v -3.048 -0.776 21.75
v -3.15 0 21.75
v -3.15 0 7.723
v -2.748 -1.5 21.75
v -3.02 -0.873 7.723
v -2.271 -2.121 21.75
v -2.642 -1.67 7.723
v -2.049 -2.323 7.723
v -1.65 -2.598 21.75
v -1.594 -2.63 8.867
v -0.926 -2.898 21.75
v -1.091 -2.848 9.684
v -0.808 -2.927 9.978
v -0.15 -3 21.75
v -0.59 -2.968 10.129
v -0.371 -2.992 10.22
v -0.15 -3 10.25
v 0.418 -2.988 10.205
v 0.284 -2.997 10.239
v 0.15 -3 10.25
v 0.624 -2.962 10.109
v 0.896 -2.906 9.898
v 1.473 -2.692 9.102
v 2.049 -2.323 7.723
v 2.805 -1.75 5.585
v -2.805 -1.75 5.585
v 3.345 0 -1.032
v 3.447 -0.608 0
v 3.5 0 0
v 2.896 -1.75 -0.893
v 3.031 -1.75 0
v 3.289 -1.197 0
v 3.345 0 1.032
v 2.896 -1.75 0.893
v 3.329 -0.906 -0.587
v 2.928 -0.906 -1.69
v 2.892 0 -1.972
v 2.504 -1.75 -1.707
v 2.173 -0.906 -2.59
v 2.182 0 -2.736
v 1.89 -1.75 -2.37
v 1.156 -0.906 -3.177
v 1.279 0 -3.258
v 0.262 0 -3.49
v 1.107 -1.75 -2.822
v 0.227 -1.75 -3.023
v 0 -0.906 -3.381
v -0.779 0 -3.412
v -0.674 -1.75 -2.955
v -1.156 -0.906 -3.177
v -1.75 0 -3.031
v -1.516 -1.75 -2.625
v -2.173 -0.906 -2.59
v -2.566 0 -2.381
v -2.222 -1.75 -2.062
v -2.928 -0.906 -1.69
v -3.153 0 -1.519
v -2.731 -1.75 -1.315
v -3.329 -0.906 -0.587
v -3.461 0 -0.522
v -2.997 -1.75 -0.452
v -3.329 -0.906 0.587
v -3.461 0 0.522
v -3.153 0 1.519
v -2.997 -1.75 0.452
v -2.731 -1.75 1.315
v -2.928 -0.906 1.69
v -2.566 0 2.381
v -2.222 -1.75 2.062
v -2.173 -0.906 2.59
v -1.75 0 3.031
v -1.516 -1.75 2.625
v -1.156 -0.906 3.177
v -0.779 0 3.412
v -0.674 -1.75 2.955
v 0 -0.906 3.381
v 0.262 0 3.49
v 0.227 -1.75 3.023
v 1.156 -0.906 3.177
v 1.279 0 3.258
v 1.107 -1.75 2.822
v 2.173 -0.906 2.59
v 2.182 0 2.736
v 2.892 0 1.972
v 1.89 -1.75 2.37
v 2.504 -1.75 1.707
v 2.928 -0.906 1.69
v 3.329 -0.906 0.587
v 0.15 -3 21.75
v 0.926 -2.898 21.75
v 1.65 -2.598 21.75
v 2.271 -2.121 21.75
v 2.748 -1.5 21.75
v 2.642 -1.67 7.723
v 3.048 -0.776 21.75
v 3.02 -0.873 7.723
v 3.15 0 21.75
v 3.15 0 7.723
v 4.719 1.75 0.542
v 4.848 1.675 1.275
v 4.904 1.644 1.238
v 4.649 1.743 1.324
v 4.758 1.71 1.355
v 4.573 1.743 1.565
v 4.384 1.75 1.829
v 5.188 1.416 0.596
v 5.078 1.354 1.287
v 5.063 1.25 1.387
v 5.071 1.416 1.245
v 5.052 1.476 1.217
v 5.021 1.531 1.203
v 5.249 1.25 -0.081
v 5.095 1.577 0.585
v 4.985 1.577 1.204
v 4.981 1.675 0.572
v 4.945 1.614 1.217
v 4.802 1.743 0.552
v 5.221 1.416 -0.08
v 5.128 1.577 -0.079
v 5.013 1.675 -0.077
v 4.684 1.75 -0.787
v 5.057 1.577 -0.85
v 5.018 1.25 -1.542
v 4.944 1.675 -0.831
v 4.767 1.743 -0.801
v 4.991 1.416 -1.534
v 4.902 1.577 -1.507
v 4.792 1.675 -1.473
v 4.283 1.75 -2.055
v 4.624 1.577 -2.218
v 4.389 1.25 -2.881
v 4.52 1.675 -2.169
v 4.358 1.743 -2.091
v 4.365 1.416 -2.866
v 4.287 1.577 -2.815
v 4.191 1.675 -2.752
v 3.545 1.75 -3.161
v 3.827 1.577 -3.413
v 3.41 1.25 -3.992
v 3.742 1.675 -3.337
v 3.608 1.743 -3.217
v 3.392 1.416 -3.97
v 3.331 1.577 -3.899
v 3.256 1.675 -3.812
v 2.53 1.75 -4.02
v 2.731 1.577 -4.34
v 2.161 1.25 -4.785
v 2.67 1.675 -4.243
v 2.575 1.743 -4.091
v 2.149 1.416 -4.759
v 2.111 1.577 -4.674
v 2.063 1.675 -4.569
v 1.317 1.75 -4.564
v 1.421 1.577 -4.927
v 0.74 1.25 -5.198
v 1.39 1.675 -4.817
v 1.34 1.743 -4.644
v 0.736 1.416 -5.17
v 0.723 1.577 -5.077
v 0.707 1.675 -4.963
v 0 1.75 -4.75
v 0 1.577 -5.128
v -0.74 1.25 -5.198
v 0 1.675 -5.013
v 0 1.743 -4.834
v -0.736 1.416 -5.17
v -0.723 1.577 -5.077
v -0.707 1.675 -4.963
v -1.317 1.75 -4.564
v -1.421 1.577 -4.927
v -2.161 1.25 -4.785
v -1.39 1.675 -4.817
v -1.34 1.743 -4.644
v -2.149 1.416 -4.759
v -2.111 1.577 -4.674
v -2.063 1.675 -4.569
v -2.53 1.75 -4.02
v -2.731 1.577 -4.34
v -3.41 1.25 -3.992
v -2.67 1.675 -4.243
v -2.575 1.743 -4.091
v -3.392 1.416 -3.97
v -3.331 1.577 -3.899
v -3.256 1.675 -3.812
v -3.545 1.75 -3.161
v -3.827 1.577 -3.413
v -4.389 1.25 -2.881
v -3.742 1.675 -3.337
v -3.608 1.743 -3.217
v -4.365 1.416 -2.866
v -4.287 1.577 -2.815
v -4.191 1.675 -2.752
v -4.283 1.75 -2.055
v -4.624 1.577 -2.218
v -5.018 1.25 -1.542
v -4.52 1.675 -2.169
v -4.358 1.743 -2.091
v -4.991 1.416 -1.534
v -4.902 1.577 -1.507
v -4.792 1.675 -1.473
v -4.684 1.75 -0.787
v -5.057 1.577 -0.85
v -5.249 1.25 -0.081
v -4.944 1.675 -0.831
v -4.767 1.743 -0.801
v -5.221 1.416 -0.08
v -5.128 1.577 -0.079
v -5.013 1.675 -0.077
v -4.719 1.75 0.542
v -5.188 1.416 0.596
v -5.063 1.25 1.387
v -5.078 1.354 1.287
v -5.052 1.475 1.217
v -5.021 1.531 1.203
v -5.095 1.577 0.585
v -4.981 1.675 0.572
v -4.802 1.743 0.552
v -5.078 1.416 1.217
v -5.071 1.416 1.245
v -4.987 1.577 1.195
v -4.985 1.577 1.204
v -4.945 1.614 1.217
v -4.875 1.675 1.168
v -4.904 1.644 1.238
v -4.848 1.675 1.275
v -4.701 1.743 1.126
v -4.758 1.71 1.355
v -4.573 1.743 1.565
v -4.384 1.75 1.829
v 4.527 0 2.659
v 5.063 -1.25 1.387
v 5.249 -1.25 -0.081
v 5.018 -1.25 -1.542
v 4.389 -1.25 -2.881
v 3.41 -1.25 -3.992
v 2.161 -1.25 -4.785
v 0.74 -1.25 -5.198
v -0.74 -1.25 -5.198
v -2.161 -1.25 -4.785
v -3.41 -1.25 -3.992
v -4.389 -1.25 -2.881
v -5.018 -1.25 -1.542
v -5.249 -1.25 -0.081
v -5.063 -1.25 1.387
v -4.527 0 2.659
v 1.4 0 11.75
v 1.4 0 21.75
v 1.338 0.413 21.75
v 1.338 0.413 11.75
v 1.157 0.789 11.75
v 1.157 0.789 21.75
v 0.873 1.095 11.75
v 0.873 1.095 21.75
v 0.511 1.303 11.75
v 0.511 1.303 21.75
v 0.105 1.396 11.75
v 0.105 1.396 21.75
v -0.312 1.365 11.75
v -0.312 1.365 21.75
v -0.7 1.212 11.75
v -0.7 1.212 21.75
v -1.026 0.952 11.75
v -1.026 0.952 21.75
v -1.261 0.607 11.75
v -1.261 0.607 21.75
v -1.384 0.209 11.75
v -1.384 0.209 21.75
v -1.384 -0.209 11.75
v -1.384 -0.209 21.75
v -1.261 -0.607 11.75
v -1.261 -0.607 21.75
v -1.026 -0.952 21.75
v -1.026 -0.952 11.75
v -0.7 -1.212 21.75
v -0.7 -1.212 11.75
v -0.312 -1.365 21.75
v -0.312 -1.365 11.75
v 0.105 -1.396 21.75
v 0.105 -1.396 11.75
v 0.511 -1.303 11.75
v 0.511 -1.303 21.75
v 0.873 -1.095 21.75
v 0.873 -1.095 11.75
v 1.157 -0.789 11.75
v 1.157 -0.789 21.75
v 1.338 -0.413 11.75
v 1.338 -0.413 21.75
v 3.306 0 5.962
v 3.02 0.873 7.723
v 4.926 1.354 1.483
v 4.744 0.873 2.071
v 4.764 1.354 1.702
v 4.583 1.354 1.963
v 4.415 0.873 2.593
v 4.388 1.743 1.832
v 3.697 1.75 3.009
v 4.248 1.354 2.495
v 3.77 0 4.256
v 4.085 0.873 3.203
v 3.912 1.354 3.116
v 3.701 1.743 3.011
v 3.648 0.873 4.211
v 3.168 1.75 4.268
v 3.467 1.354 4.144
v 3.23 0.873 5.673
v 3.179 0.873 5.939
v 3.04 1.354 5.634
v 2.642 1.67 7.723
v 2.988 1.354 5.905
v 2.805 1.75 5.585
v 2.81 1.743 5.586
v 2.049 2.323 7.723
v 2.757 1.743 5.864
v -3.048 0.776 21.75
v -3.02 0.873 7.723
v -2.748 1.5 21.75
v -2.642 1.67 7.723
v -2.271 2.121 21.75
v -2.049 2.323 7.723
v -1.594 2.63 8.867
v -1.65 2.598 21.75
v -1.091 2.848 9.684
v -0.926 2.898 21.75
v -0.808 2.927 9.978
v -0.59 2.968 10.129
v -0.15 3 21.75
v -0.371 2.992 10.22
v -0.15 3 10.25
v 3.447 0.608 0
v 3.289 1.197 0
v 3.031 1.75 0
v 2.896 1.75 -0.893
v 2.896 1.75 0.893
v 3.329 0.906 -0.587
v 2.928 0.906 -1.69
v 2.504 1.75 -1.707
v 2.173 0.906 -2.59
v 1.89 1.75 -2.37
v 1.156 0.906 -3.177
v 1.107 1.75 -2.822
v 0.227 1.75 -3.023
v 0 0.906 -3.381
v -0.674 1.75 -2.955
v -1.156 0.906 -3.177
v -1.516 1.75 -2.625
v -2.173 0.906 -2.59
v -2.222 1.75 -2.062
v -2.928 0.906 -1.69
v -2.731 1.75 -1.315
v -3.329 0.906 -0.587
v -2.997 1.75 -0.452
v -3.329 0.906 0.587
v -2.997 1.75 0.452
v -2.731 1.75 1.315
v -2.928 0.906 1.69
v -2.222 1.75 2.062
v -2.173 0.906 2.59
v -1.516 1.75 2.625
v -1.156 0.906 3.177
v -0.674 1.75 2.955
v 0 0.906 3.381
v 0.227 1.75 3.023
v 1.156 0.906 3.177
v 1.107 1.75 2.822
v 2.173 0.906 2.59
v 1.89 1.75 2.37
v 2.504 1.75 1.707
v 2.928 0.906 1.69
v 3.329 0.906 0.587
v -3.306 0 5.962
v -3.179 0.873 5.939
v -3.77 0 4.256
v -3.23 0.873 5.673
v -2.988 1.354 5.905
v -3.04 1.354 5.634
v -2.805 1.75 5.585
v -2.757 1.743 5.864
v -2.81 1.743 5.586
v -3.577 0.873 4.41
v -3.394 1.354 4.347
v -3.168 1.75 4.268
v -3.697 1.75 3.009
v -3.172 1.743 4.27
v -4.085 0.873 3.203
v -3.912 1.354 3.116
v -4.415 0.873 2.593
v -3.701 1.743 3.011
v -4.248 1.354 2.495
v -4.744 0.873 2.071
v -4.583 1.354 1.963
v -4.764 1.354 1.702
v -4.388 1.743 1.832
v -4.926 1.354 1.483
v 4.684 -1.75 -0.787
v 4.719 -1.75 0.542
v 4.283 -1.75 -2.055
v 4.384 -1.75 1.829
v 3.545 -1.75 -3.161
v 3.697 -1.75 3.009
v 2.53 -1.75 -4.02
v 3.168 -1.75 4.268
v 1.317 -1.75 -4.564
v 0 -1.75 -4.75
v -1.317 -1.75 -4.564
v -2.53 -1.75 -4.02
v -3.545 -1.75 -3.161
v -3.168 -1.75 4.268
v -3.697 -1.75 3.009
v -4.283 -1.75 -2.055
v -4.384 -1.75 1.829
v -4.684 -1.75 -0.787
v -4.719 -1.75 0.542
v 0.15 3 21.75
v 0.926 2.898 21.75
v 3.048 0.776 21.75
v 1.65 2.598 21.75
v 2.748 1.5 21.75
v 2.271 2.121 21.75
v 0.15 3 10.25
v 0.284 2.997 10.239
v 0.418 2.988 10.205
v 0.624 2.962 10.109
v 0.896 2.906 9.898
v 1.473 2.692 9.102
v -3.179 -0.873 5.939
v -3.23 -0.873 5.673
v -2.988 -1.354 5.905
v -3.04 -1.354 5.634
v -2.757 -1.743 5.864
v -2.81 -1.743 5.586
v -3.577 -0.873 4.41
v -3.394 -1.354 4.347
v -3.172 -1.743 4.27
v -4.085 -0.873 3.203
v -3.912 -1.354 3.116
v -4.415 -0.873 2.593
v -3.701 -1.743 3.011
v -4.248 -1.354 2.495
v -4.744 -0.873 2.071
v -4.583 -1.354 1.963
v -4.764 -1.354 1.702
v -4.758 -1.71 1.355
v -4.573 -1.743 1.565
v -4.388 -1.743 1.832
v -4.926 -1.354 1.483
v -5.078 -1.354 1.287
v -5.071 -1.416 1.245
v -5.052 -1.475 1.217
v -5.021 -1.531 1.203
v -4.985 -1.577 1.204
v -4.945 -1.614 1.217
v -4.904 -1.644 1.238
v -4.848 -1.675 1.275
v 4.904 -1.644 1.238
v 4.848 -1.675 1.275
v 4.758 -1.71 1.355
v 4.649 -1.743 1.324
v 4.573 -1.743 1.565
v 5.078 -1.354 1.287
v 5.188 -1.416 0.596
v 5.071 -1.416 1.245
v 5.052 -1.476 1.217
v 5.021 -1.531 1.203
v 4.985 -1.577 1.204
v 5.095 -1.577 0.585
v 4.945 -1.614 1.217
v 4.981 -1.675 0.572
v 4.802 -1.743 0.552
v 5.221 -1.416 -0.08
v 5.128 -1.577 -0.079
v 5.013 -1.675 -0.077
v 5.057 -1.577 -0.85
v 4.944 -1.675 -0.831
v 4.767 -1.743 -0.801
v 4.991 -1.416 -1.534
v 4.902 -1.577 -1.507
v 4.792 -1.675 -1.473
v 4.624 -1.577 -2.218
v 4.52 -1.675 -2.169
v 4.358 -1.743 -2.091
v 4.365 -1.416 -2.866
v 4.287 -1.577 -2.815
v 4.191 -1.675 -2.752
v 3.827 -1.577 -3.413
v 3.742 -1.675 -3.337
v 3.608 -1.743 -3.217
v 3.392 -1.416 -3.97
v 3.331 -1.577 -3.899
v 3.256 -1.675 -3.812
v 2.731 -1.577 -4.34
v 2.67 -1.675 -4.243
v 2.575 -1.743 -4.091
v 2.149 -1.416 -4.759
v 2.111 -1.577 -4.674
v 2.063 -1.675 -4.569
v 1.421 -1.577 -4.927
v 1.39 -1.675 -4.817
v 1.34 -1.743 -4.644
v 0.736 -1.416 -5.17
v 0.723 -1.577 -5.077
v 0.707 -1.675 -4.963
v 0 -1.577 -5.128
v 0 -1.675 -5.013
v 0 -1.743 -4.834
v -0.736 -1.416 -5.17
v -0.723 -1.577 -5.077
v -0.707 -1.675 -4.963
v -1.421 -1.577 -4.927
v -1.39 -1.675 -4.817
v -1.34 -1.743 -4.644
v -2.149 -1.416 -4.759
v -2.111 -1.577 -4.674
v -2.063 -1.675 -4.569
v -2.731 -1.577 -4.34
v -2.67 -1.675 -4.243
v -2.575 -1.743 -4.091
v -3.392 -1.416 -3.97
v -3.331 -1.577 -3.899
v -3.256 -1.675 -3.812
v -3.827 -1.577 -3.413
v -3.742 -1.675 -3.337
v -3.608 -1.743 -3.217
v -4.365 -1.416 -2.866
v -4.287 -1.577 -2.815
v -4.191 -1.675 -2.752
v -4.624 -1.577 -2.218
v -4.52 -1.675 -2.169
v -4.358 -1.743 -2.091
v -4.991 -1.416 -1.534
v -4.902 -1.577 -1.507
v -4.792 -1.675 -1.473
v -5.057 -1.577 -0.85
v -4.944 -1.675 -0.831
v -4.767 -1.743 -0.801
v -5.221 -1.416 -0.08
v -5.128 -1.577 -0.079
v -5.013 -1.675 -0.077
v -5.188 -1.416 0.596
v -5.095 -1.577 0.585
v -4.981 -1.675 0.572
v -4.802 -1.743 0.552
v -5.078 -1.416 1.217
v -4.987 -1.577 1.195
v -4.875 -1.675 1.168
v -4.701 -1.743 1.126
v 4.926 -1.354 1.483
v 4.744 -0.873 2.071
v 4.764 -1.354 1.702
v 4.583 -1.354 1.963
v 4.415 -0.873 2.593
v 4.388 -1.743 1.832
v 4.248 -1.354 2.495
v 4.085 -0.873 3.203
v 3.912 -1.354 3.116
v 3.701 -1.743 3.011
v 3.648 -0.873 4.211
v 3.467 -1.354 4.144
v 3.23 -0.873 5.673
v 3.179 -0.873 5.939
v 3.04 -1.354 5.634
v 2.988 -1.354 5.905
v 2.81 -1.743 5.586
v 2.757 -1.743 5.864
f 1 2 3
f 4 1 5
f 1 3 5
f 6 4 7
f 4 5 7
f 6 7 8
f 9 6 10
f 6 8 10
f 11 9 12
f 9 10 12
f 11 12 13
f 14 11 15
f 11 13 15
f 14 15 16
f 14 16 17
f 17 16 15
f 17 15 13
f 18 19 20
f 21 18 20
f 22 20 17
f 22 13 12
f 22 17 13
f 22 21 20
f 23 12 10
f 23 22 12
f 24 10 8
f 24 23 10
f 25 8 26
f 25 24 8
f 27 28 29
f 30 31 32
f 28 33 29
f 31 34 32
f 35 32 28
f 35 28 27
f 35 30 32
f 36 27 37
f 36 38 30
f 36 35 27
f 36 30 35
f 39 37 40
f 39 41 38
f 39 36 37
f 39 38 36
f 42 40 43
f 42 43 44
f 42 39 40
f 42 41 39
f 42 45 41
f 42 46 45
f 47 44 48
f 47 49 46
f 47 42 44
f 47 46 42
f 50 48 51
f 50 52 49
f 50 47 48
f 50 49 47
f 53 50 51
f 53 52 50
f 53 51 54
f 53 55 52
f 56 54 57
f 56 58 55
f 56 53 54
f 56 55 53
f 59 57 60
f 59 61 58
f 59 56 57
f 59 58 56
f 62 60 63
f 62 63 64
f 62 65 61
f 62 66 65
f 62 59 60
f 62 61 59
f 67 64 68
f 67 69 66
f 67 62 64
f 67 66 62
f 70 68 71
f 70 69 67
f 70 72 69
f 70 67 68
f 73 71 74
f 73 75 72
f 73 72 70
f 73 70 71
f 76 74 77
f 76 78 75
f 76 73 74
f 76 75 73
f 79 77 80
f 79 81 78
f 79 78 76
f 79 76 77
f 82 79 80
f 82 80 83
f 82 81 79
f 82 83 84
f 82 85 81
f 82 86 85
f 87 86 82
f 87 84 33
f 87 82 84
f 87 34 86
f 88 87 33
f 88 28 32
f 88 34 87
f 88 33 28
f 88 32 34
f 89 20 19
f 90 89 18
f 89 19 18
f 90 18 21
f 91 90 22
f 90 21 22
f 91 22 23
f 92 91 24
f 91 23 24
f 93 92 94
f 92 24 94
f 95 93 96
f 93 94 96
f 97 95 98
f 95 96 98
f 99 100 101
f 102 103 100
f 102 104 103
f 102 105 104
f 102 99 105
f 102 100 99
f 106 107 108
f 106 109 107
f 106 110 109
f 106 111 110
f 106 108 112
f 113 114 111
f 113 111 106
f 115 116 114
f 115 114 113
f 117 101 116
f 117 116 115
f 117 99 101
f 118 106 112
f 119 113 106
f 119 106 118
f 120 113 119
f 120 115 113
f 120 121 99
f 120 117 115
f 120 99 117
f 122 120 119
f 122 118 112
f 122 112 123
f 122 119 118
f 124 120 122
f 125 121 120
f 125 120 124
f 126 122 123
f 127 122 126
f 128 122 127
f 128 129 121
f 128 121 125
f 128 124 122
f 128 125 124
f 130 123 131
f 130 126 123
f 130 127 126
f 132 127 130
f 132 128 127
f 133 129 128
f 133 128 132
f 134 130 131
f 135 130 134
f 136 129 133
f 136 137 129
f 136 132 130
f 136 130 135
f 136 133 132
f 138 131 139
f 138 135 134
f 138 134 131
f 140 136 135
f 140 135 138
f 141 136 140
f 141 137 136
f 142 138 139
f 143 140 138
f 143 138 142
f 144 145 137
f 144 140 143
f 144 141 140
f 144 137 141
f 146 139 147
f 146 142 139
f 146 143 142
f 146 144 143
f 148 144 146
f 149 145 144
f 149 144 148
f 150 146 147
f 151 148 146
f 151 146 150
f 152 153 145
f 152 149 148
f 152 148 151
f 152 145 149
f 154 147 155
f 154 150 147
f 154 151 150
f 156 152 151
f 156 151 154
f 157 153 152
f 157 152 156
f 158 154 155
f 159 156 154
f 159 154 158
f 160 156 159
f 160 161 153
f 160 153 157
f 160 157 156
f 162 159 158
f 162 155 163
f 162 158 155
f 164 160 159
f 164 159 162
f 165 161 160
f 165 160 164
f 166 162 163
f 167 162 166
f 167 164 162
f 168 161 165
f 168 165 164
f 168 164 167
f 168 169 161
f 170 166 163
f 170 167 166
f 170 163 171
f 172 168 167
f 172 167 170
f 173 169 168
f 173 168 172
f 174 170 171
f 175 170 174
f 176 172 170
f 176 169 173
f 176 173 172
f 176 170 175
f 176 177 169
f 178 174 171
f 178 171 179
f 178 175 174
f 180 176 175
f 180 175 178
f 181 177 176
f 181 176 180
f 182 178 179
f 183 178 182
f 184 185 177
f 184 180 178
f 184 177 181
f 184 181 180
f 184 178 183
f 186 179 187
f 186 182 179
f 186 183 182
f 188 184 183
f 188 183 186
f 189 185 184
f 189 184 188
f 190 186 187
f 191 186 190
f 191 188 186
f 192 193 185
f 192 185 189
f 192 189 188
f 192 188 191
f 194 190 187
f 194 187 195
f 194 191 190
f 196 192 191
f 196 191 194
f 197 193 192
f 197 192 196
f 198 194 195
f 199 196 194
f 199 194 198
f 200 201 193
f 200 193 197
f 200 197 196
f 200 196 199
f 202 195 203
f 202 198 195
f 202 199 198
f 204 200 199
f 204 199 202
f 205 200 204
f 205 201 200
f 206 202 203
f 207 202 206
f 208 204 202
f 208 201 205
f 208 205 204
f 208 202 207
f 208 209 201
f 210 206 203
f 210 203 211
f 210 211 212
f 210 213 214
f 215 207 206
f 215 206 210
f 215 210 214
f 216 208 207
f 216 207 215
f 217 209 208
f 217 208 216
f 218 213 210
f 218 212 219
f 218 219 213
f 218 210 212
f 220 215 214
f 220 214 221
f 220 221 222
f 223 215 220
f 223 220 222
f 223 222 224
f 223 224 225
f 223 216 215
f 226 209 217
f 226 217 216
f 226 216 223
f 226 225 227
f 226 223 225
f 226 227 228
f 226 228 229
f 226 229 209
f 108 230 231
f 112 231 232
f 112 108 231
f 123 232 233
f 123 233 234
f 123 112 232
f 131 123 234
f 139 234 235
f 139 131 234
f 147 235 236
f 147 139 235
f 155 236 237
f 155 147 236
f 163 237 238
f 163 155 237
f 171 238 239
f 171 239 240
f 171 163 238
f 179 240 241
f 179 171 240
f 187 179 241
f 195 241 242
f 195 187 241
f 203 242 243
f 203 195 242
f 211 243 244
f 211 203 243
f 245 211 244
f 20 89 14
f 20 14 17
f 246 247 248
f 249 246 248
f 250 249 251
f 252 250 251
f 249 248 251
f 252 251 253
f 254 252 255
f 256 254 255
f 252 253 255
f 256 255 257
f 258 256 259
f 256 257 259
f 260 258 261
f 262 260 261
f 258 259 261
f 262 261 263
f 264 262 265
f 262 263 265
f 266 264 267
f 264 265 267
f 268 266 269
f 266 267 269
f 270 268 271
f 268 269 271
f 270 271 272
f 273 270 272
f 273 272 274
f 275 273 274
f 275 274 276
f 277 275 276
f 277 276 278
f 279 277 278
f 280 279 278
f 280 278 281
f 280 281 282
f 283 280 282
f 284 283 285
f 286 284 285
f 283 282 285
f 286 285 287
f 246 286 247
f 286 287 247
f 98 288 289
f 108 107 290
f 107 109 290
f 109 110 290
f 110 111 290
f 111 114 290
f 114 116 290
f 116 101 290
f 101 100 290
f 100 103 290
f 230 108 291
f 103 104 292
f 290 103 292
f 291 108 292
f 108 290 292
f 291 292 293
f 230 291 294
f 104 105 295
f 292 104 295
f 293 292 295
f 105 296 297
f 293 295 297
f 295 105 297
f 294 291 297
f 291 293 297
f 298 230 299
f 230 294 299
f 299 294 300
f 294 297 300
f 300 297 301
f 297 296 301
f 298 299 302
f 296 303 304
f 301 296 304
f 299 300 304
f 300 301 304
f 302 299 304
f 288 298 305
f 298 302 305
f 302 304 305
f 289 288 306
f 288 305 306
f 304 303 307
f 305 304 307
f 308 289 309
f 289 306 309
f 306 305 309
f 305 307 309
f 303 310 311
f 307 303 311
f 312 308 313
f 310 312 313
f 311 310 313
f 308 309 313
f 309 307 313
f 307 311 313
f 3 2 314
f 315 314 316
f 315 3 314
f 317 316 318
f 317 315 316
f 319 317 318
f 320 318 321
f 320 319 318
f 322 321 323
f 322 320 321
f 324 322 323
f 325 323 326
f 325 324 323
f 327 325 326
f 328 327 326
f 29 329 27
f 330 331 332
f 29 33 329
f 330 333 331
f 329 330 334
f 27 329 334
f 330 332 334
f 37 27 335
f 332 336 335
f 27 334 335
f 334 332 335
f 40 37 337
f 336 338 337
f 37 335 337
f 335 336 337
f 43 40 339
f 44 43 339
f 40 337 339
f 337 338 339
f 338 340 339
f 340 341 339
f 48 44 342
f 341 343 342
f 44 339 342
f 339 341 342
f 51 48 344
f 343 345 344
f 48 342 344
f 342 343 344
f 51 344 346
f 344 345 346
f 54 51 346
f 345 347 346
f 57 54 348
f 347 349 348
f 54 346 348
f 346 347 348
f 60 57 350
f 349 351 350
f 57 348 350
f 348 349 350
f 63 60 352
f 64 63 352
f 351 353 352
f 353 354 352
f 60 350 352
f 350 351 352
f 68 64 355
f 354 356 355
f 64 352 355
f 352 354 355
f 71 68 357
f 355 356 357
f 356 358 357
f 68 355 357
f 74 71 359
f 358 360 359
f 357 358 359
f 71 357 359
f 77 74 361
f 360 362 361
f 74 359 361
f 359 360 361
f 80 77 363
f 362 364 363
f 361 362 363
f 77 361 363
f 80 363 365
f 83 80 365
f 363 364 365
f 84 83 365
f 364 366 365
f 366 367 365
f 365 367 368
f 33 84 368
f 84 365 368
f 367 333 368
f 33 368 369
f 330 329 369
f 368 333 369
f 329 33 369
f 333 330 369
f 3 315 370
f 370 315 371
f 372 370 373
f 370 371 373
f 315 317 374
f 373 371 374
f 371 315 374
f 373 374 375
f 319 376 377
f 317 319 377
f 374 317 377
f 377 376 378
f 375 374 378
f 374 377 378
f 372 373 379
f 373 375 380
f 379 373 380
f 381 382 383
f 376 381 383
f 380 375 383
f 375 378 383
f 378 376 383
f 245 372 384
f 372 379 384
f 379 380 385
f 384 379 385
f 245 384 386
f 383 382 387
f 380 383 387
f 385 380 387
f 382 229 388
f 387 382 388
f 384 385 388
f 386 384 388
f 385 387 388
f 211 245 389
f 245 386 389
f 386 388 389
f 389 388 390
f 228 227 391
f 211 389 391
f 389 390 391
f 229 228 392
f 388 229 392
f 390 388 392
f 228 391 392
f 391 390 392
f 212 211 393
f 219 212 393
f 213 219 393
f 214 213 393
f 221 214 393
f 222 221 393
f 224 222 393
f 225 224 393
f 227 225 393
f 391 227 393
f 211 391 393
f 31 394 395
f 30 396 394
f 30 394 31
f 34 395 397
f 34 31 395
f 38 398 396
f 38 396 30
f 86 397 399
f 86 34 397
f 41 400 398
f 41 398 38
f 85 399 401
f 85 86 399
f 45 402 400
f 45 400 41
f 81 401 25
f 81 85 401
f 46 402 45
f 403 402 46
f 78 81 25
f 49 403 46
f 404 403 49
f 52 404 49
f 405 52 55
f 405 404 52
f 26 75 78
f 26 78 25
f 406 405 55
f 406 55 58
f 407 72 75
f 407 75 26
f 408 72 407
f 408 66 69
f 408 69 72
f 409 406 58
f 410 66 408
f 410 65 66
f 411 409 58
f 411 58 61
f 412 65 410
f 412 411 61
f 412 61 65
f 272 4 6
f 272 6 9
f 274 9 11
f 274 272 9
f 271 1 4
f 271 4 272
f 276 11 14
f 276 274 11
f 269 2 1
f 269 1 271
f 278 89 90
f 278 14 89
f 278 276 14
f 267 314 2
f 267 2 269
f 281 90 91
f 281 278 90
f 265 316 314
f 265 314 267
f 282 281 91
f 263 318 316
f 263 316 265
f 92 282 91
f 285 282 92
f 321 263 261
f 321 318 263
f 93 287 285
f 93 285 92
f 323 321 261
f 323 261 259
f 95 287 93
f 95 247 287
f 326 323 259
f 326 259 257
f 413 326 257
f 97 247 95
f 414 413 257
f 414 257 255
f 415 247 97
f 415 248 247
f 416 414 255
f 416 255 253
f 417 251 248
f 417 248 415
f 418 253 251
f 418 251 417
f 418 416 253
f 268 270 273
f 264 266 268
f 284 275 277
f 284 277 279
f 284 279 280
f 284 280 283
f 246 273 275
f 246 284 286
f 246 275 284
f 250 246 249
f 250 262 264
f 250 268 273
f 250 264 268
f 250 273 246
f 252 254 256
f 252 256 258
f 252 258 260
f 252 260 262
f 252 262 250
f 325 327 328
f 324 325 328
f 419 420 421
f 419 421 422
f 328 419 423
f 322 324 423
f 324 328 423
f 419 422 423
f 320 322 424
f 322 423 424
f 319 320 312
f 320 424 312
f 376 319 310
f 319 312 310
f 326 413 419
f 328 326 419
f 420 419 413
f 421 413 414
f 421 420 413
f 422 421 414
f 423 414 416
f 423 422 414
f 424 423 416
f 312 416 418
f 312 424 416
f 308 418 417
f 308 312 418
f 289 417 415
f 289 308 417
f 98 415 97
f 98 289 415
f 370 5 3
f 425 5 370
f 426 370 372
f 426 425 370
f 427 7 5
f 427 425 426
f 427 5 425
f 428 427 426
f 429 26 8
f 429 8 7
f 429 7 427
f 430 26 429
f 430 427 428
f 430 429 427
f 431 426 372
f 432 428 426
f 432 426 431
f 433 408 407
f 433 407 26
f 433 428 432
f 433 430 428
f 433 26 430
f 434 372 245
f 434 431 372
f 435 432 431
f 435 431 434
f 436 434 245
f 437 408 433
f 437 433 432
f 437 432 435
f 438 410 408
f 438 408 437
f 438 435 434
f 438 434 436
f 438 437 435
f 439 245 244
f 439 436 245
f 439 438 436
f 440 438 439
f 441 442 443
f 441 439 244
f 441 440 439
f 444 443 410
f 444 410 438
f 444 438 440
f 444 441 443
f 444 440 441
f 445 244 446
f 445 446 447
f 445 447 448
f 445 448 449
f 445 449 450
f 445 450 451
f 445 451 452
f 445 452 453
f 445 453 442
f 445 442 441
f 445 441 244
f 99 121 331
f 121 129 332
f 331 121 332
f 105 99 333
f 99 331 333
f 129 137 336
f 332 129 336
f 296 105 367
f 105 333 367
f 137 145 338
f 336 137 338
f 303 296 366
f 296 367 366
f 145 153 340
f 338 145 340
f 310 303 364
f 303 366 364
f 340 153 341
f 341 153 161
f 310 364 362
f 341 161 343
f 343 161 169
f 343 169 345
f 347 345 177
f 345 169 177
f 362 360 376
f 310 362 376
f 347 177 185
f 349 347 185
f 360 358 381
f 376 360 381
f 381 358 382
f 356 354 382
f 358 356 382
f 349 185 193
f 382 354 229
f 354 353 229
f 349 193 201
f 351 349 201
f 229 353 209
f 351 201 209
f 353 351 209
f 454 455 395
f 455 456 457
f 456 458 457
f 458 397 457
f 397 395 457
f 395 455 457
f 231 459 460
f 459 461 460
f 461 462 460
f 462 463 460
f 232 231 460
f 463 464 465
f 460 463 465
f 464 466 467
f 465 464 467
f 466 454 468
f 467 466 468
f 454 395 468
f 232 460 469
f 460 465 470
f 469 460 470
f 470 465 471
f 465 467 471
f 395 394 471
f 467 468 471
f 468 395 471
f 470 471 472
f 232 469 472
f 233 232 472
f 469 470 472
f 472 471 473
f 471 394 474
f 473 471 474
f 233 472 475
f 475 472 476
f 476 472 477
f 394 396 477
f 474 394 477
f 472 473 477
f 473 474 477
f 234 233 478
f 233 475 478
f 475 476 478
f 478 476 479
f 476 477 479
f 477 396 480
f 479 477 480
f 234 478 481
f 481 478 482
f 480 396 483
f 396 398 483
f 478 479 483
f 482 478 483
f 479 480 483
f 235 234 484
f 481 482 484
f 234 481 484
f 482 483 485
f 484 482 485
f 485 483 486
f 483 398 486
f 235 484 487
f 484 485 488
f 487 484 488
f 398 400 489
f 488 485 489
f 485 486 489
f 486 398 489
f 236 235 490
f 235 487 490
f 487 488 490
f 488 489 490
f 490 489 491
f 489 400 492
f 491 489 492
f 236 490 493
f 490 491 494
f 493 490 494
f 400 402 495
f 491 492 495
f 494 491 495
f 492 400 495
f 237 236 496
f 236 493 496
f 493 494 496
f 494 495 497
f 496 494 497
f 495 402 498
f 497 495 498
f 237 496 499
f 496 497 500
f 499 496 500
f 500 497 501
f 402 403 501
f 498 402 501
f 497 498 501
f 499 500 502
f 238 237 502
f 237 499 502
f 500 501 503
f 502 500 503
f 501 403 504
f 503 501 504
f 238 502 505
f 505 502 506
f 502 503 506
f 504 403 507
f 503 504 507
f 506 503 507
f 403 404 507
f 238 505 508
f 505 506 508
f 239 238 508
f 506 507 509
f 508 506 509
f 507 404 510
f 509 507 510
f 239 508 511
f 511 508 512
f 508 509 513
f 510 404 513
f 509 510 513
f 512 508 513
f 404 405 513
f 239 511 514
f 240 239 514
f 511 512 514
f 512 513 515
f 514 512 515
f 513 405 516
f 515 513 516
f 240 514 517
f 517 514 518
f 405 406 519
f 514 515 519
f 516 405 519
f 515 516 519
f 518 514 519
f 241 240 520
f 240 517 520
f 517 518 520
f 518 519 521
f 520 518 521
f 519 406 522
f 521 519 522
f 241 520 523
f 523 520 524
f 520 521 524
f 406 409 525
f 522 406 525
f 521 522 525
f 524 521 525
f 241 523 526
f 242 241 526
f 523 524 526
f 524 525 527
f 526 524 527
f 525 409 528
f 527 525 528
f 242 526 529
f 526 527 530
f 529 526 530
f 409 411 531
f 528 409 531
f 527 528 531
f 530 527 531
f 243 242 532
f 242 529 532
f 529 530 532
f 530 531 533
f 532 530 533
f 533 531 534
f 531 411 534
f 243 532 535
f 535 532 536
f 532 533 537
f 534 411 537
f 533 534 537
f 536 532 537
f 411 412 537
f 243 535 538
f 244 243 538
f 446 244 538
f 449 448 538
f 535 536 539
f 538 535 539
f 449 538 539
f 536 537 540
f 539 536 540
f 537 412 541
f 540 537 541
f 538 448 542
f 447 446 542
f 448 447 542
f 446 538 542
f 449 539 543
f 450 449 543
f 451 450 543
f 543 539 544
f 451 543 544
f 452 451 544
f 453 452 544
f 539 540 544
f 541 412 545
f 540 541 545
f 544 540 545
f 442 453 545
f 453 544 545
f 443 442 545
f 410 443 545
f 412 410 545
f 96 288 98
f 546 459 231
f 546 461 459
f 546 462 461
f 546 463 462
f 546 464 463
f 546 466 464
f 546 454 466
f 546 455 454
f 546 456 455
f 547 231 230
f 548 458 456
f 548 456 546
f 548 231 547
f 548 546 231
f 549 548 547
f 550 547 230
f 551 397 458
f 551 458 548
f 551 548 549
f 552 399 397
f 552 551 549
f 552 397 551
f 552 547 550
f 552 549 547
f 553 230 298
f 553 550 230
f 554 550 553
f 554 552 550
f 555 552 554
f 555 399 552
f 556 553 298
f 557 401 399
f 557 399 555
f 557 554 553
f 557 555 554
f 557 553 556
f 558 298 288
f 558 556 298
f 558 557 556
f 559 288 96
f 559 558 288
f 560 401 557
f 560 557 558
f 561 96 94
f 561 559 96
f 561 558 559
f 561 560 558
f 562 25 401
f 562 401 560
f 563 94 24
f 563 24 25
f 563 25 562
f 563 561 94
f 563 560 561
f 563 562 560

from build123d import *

# Parameters (mm, degrees)
BOSS_EXTRUDE1_DEPTH = 3
CUT_EXTRUDE1_START  = -1.25
CUT_EXTRUDE1_DEPTH  = 1.25
FILLET2_R           = 10
CHAMFER1_SIZE       = 5
CHAMFER1_SIZE_2     = 1.339745962
FILLET3_START       = 7.722693831
FILLET3_DEPTH       = 14.027306169
FILLET3_2_ANGLE     = 41.120463
FILLET3_3_ANGLE     = 41.120463
FILLET4_R           = 0.5
SKETCH10_R          = 1.4
CUT_EXTRUDE3_DEPTH  = 10


with BuildPart() as part:
    # Sketch1 → Boss-Extrude1 (new body)
    with BuildSketch(Plane(origin=(0, 0, 0), x_dir=(1, 0, 0), z_dir=(0, 1, 0))):
        with BuildLine():
            Line((-3.15, -4.2), (-3.15, -21.75))
            Line((-3.15, -21.75), (3.15, -21.75))
            Line((3.15, -21.75), (3.15, -4.2))
            ThreePointArc((3.15, -4.2), (0, 5.25), (-3.15, -4.2))
        make_face()
    extrude(amount=BOSS_EXTRUDE1_DEPTH)

    # Sketch2 → Cut-Extrude1 (cut)
    with BuildSketch(Plane(origin=(0, 3, 0), x_dir=(1, 0, 0), z_dir=(0, 1, 0)).offset(CUT_EXTRUDE1_START)):
        with BuildLine():
            Line((-3.15, -4.2), (-3.15, -5.25))
            Line((-3.15, -5.25), (3.15, -5.25))
            Line((3.15, -5.25), (3.15, -4.2))
            ThreePointArc((3.15, -4.2), (0, 5.25), (-3.15, -4.2))
        make_face()
    extrude(amount=CUT_EXTRUDE1_DEPTH, mode=Mode.SUBTRACT)

    # Cut-Sweep1: sweep along a path in Sketch9
    with BuildLine(Plane(origin=(0, 0, 0), x_dir=(1, 0, 0), z_dir=(0, 1, 0))) as cut_sweep1_path:
        CenterArc((0, 0), 3.5, 0, 360)
    # Sketch8 → Cut-Sweep1 (sweep, cut)
    with BuildSketch(Plane(origin=(0, 0, 0), x_dir=(0, 0, -1), z_dir=(1, 0, 0))):
        with BuildLine():
            Line((0, 3.5), (0, 0))
            Line((0, 0), (3.5, 0))
            ThreePointArc((3.5, 0), (2.474873734, 2.474873734), (0, 3.5))
        make_face()
    sweep(path=cut_sweep1_path.line, mode=Mode.SUBTRACT)

    # Fillet2
    # the kernel refuses this fillet: 10 mm, written as the material it adds along each edge
    with BuildSketch(Plane(origin=(-3.15, 0, 4.2), x_dir=(0, 0, 1), z_dir=(0, 1, 0))) as fillet2_piece_1_section:
        with BuildLine():
            CenterArc((3.522693831, -10), FILLET2_R, 90, 30.424740483)
            ThreePointArc((-1.541367698, -1.37704918), (-0.702247096, -0.765127664), (0, 0))
            Line((0, 0), (3.522693831, 0))
        make_face()
    fillet2_piece_1 = extrude(amount=1.75, mode=Mode.PRIVATE)
    fillet2_piece_1 = split(fillet2_piece_1, bisect_by=Plane(origin=(-3.15, 0, 5.25), z_dir=(0, 0, 1)), keep=Keep.TOP, mode=Mode.PRIVATE)
    add(fillet2_piece_1)
    with BuildSketch(Plane(origin=(-3.15, 0, 4.2), x_dir=(0, 0, 1), z_dir=(0, 1, 0))) as fillet2_piece_2_section:
        with BuildLine():
            CenterArc((3.522693831, -10), FILLET2_R, 90, 30.424740483)
            ThreePointArc((-1.541367698, -1.37704918), (-0.702247096, -0.765127664), (0, 0))
            Line((0, 0), (3.522693831, 0))
        make_face()
    fillet2_piece_2 = extrude(amount=1.75, mode=Mode.PRIVATE)
    fillet2_piece_2 = split(fillet2_piece_2, bisect_by=Plane(origin=(-3.15, 0, 5.25), z_dir=(0, 0, -1)), keep=Keep.TOP, mode=Mode.PRIVATE)
    add(fillet2_piece_2)
    with BuildSketch(Plane(origin=(-3.15, 0, 4.2), x_dir=(0, 0, 1), z_dir=(0, 1, 0))) as fillet2_piece_3_section:
        with BuildLine():
            CenterArc((3.522693831, -10), FILLET2_R, 90, 30.424740483)
            ThreePointArc((-1.541367698, -1.37704918), (-0.702247096, -0.765127664), (0, 0))
            Line((0, 0), (3.522693831, 0))
        make_face()
    fillet2_piece_3 = extrude(amount=10.556734576, mode=Mode.PRIVATE)
    fillet2_piece_3 = split(fillet2_piece_3, bisect_by=Plane(origin=(-3.15, 3, 4.2), z_dir=(0, -1, 0)), keep=Keep.TOP, mode=Mode.PRIVATE)
    fillet2_piece_3 = split(fillet2_piece_3, bisect_by=Plane(origin=(-3.15, 0, 5.25), z_dir=(0, 0, 1)), keep=Keep.TOP, mode=Mode.PRIVATE)
    fillet2_piece_3 = split(fillet2_piece_3, bisect_by=Plane(origin=(-3.15, 1.75, 4.2), z_dir=(0, 1, 0)), keep=Keep.TOP, mode=Mode.PRIVATE)
    add(fillet2_piece_3)
    with BuildSketch(Plane(origin=(3.15, 0, 4.2), x_dir=(0.6662386483372984, 0, -0.7457386026361313), z_dir=(0, 1, 0))) as fillet2_piece_4_section:
        with BuildLine():
            CenterArc((4.035377709, -9.804340803), FILLET2_R, 101.352680936, 30.424740483)
            Line((-2.627008775, -2.346954776), (0, 0))
            ThreePointArc((0, 0), (1.033450389, -0.102721079), (2.066900778, 0))
        make_face()
    fillet2_piece_4 = extrude(amount=1.75, mode=Mode.PRIVATE)
    fillet2_piece_4 = split(fillet2_piece_4, bisect_by=Plane(origin=(3.15, 0, 5.25), z_dir=(0, 0, -1)), keep=Keep.TOP, mode=Mode.PRIVATE)
    add(fillet2_piece_4)
    with BuildSketch(Plane(origin=(3.15, 0, 4.2), x_dir=(0.6662386483372984, 0, -0.7457386026361313), z_dir=(0, 1, 0))) as fillet2_piece_5_section:
        with BuildLine():
            CenterArc((4.035377709, -9.804340803), FILLET2_R, 101.352680936, 30.424740483)
            Line((-2.627008775, -2.346954776), (0, 0))
            ThreePointArc((0, 0), (1.033450389, -0.102721079), (2.066900778, 0))
        make_face()
    fillet2_piece_5 = extrude(amount=1.75, mode=Mode.PRIVATE)
    fillet2_piece_5 = split(fillet2_piece_5, bisect_by=Plane(origin=(3.15, 0, 5.25), z_dir=(0, 0, 1)), keep=Keep.TOP, mode=Mode.PRIVATE)
    add(fillet2_piece_5)
    with BuildSketch(Plane(origin=(3.15, 0, 4.2), x_dir=(0.6662386483372984, 0, -0.7457386026361313), z_dir=(0, 1, 0))) as fillet2_piece_6_section:
        with BuildLine():
            CenterArc((4.035377709, -9.804340803), FILLET2_R, 101.352680936, 30.424740483)
            Line((-2.627008775, -2.346954776), (0, 0))
            ThreePointArc((0, 0), (1.033450389, -0.102721079), (2.066900778, 0))
        make_face()
    fillet2_piece_6 = extrude(amount=10.556734576, mode=Mode.PRIVATE)
    fillet2_piece_6 = split(fillet2_piece_6, bisect_by=Plane(origin=(3.15, 3, 4.2), z_dir=(0, -1, 0)), keep=Keep.TOP, mode=Mode.PRIVATE)
    fillet2_piece_6 = split(fillet2_piece_6, bisect_by=Plane(origin=(3.15, 0, 5.25), z_dir=(0, 0, 1)), keep=Keep.TOP, mode=Mode.PRIVATE)
    fillet2_piece_6 = split(fillet2_piece_6, bisect_by=Plane(origin=(3.15, 1.75, 4.2), z_dir=(0, 1, 0)), keep=Keep.TOP, mode=Mode.PRIVATE)
    add(fillet2_piece_6)

    # Chamfer1
    # the kernel refuses this chamfer: 5, 1.339745962 mm, written as the material it takes off along each edge
    with BuildSketch(Plane(origin=(16.444140104, 3, 5.25), x_dir=(0, 0, 1), z_dir=(-1, 0, 0))) as chamfer1_piece_1_section:
        Polygon((CHAMFER1_SIZE, 0), (0, -CHAMFER1_SIZE_2), (0, 0), align=None)
    chamfer1_piece_1 = extrude(amount=32.888280208, mode=Mode.PRIVATE)
    chamfer1_piece_1 = split(chamfer1_piece_1, bisect_by=Plane(origin=(16.444140104, 1.75, 5.25), z_dir=(0, 1, 0)), keep=Keep.TOP, mode=Mode.PRIVATE)
    add(chamfer1_piece_1, mode=Mode.SUBTRACT)

    # Fillet3: read off the stored shape, not the designer's step
    # Fillet3 outline → Fillet3 (cut)
    with BuildSketch(Plane.XY.offset(FILLET3_START)):
        with BuildLine():
            ThreePointArc((-3.15, 0), (-2.271320344, 2.121320344), (-0.15, 3))
            Line((-0.15, 3), (-3.15, 3))
            Line((-3.15, 3), (-3.15, 0))
        make_face()
        with BuildLine():
            Line((3.15, 0), (3.15, 3))
            Line((3.15, 3), (0.15, 3))
            ThreePointArc((0.15, 3), (2.271320344, 2.121320344), (3.15, 0))
        make_face()
    extrude(amount=FILLET3_DEPTH, mode=Mode.SUBTRACT)

    # Fillet3 2 outline → Fillet3 2 (revolve, cut)
    with BuildSketch(Plane(origin=(-13.15, 0, 7.722693831), x_dir=(1, 0, 0), z_dir=(0, 0, 1))):
        with BuildLine():
            ThreePointArc((10, 0), (10.289308449, 1.285360382), (11.101434209, 2.322810353))
            Line((11.101434209, 2.322810353), (10, 2.322810353))
            Line((10, 2.322810353), (10, 0))
        make_face()
    revolve(axis=Axis((-13.15, 0, 7.722693831), (0, 1, 0)), revolution_arc=FILLET3_2_ANGLE, mode=Mode.SUBTRACT)

    # Fillet3 3 outline → Fillet3 3 (revolve, cut)
    with BuildSketch(Plane(origin=(13.15, 0, 7.722693831), x_dir=(-0.7533285646584991, 0, -0.6576443367577688), z_dir=(0.6576443367577688, 0, -0.7533285646584991))):
        with BuildLine():
            ThreePointArc((10, 0), (10.289308449, 1.285360382), (11.101434209, 2.322810353))
            Line((11.101434209, 2.322810353), (10, 2.322810353))
            Line((10, 2.322810353), (10, 0))
        make_face()
    revolve(axis=Axis((13.15, 0, 7.722693831), (0, 1, 0)), revolution_arc=FILLET3_3_ANGLE, mode=Mode.SUBTRACT)

    # Fillet4
    fillet4_edges = [part.edges().sort_by_distance(p)[0] for p in [
        (-1e-09, 1.75, -5.25),
    ]]
    fillet(fillet4_edges, radius=FILLET4_R)

    # Mirror2: read off the stored shape, not the designer's step
    # Mirror2: part across plane


with BuildPart() as part_1:
    add(part.part)
    add(part.part.mirror(Plane.ZX))

    # Sketch10 → Cut-Extrude3 (cut)
    with BuildSketch(Plane.XY.offset(21.75)):
        Circle(SKETCH10_R)
    extrude(amount=-CUT_EXTRUDE3_DEPTH, mode=Mode.SUBTRACT)


solid = part_1.part
